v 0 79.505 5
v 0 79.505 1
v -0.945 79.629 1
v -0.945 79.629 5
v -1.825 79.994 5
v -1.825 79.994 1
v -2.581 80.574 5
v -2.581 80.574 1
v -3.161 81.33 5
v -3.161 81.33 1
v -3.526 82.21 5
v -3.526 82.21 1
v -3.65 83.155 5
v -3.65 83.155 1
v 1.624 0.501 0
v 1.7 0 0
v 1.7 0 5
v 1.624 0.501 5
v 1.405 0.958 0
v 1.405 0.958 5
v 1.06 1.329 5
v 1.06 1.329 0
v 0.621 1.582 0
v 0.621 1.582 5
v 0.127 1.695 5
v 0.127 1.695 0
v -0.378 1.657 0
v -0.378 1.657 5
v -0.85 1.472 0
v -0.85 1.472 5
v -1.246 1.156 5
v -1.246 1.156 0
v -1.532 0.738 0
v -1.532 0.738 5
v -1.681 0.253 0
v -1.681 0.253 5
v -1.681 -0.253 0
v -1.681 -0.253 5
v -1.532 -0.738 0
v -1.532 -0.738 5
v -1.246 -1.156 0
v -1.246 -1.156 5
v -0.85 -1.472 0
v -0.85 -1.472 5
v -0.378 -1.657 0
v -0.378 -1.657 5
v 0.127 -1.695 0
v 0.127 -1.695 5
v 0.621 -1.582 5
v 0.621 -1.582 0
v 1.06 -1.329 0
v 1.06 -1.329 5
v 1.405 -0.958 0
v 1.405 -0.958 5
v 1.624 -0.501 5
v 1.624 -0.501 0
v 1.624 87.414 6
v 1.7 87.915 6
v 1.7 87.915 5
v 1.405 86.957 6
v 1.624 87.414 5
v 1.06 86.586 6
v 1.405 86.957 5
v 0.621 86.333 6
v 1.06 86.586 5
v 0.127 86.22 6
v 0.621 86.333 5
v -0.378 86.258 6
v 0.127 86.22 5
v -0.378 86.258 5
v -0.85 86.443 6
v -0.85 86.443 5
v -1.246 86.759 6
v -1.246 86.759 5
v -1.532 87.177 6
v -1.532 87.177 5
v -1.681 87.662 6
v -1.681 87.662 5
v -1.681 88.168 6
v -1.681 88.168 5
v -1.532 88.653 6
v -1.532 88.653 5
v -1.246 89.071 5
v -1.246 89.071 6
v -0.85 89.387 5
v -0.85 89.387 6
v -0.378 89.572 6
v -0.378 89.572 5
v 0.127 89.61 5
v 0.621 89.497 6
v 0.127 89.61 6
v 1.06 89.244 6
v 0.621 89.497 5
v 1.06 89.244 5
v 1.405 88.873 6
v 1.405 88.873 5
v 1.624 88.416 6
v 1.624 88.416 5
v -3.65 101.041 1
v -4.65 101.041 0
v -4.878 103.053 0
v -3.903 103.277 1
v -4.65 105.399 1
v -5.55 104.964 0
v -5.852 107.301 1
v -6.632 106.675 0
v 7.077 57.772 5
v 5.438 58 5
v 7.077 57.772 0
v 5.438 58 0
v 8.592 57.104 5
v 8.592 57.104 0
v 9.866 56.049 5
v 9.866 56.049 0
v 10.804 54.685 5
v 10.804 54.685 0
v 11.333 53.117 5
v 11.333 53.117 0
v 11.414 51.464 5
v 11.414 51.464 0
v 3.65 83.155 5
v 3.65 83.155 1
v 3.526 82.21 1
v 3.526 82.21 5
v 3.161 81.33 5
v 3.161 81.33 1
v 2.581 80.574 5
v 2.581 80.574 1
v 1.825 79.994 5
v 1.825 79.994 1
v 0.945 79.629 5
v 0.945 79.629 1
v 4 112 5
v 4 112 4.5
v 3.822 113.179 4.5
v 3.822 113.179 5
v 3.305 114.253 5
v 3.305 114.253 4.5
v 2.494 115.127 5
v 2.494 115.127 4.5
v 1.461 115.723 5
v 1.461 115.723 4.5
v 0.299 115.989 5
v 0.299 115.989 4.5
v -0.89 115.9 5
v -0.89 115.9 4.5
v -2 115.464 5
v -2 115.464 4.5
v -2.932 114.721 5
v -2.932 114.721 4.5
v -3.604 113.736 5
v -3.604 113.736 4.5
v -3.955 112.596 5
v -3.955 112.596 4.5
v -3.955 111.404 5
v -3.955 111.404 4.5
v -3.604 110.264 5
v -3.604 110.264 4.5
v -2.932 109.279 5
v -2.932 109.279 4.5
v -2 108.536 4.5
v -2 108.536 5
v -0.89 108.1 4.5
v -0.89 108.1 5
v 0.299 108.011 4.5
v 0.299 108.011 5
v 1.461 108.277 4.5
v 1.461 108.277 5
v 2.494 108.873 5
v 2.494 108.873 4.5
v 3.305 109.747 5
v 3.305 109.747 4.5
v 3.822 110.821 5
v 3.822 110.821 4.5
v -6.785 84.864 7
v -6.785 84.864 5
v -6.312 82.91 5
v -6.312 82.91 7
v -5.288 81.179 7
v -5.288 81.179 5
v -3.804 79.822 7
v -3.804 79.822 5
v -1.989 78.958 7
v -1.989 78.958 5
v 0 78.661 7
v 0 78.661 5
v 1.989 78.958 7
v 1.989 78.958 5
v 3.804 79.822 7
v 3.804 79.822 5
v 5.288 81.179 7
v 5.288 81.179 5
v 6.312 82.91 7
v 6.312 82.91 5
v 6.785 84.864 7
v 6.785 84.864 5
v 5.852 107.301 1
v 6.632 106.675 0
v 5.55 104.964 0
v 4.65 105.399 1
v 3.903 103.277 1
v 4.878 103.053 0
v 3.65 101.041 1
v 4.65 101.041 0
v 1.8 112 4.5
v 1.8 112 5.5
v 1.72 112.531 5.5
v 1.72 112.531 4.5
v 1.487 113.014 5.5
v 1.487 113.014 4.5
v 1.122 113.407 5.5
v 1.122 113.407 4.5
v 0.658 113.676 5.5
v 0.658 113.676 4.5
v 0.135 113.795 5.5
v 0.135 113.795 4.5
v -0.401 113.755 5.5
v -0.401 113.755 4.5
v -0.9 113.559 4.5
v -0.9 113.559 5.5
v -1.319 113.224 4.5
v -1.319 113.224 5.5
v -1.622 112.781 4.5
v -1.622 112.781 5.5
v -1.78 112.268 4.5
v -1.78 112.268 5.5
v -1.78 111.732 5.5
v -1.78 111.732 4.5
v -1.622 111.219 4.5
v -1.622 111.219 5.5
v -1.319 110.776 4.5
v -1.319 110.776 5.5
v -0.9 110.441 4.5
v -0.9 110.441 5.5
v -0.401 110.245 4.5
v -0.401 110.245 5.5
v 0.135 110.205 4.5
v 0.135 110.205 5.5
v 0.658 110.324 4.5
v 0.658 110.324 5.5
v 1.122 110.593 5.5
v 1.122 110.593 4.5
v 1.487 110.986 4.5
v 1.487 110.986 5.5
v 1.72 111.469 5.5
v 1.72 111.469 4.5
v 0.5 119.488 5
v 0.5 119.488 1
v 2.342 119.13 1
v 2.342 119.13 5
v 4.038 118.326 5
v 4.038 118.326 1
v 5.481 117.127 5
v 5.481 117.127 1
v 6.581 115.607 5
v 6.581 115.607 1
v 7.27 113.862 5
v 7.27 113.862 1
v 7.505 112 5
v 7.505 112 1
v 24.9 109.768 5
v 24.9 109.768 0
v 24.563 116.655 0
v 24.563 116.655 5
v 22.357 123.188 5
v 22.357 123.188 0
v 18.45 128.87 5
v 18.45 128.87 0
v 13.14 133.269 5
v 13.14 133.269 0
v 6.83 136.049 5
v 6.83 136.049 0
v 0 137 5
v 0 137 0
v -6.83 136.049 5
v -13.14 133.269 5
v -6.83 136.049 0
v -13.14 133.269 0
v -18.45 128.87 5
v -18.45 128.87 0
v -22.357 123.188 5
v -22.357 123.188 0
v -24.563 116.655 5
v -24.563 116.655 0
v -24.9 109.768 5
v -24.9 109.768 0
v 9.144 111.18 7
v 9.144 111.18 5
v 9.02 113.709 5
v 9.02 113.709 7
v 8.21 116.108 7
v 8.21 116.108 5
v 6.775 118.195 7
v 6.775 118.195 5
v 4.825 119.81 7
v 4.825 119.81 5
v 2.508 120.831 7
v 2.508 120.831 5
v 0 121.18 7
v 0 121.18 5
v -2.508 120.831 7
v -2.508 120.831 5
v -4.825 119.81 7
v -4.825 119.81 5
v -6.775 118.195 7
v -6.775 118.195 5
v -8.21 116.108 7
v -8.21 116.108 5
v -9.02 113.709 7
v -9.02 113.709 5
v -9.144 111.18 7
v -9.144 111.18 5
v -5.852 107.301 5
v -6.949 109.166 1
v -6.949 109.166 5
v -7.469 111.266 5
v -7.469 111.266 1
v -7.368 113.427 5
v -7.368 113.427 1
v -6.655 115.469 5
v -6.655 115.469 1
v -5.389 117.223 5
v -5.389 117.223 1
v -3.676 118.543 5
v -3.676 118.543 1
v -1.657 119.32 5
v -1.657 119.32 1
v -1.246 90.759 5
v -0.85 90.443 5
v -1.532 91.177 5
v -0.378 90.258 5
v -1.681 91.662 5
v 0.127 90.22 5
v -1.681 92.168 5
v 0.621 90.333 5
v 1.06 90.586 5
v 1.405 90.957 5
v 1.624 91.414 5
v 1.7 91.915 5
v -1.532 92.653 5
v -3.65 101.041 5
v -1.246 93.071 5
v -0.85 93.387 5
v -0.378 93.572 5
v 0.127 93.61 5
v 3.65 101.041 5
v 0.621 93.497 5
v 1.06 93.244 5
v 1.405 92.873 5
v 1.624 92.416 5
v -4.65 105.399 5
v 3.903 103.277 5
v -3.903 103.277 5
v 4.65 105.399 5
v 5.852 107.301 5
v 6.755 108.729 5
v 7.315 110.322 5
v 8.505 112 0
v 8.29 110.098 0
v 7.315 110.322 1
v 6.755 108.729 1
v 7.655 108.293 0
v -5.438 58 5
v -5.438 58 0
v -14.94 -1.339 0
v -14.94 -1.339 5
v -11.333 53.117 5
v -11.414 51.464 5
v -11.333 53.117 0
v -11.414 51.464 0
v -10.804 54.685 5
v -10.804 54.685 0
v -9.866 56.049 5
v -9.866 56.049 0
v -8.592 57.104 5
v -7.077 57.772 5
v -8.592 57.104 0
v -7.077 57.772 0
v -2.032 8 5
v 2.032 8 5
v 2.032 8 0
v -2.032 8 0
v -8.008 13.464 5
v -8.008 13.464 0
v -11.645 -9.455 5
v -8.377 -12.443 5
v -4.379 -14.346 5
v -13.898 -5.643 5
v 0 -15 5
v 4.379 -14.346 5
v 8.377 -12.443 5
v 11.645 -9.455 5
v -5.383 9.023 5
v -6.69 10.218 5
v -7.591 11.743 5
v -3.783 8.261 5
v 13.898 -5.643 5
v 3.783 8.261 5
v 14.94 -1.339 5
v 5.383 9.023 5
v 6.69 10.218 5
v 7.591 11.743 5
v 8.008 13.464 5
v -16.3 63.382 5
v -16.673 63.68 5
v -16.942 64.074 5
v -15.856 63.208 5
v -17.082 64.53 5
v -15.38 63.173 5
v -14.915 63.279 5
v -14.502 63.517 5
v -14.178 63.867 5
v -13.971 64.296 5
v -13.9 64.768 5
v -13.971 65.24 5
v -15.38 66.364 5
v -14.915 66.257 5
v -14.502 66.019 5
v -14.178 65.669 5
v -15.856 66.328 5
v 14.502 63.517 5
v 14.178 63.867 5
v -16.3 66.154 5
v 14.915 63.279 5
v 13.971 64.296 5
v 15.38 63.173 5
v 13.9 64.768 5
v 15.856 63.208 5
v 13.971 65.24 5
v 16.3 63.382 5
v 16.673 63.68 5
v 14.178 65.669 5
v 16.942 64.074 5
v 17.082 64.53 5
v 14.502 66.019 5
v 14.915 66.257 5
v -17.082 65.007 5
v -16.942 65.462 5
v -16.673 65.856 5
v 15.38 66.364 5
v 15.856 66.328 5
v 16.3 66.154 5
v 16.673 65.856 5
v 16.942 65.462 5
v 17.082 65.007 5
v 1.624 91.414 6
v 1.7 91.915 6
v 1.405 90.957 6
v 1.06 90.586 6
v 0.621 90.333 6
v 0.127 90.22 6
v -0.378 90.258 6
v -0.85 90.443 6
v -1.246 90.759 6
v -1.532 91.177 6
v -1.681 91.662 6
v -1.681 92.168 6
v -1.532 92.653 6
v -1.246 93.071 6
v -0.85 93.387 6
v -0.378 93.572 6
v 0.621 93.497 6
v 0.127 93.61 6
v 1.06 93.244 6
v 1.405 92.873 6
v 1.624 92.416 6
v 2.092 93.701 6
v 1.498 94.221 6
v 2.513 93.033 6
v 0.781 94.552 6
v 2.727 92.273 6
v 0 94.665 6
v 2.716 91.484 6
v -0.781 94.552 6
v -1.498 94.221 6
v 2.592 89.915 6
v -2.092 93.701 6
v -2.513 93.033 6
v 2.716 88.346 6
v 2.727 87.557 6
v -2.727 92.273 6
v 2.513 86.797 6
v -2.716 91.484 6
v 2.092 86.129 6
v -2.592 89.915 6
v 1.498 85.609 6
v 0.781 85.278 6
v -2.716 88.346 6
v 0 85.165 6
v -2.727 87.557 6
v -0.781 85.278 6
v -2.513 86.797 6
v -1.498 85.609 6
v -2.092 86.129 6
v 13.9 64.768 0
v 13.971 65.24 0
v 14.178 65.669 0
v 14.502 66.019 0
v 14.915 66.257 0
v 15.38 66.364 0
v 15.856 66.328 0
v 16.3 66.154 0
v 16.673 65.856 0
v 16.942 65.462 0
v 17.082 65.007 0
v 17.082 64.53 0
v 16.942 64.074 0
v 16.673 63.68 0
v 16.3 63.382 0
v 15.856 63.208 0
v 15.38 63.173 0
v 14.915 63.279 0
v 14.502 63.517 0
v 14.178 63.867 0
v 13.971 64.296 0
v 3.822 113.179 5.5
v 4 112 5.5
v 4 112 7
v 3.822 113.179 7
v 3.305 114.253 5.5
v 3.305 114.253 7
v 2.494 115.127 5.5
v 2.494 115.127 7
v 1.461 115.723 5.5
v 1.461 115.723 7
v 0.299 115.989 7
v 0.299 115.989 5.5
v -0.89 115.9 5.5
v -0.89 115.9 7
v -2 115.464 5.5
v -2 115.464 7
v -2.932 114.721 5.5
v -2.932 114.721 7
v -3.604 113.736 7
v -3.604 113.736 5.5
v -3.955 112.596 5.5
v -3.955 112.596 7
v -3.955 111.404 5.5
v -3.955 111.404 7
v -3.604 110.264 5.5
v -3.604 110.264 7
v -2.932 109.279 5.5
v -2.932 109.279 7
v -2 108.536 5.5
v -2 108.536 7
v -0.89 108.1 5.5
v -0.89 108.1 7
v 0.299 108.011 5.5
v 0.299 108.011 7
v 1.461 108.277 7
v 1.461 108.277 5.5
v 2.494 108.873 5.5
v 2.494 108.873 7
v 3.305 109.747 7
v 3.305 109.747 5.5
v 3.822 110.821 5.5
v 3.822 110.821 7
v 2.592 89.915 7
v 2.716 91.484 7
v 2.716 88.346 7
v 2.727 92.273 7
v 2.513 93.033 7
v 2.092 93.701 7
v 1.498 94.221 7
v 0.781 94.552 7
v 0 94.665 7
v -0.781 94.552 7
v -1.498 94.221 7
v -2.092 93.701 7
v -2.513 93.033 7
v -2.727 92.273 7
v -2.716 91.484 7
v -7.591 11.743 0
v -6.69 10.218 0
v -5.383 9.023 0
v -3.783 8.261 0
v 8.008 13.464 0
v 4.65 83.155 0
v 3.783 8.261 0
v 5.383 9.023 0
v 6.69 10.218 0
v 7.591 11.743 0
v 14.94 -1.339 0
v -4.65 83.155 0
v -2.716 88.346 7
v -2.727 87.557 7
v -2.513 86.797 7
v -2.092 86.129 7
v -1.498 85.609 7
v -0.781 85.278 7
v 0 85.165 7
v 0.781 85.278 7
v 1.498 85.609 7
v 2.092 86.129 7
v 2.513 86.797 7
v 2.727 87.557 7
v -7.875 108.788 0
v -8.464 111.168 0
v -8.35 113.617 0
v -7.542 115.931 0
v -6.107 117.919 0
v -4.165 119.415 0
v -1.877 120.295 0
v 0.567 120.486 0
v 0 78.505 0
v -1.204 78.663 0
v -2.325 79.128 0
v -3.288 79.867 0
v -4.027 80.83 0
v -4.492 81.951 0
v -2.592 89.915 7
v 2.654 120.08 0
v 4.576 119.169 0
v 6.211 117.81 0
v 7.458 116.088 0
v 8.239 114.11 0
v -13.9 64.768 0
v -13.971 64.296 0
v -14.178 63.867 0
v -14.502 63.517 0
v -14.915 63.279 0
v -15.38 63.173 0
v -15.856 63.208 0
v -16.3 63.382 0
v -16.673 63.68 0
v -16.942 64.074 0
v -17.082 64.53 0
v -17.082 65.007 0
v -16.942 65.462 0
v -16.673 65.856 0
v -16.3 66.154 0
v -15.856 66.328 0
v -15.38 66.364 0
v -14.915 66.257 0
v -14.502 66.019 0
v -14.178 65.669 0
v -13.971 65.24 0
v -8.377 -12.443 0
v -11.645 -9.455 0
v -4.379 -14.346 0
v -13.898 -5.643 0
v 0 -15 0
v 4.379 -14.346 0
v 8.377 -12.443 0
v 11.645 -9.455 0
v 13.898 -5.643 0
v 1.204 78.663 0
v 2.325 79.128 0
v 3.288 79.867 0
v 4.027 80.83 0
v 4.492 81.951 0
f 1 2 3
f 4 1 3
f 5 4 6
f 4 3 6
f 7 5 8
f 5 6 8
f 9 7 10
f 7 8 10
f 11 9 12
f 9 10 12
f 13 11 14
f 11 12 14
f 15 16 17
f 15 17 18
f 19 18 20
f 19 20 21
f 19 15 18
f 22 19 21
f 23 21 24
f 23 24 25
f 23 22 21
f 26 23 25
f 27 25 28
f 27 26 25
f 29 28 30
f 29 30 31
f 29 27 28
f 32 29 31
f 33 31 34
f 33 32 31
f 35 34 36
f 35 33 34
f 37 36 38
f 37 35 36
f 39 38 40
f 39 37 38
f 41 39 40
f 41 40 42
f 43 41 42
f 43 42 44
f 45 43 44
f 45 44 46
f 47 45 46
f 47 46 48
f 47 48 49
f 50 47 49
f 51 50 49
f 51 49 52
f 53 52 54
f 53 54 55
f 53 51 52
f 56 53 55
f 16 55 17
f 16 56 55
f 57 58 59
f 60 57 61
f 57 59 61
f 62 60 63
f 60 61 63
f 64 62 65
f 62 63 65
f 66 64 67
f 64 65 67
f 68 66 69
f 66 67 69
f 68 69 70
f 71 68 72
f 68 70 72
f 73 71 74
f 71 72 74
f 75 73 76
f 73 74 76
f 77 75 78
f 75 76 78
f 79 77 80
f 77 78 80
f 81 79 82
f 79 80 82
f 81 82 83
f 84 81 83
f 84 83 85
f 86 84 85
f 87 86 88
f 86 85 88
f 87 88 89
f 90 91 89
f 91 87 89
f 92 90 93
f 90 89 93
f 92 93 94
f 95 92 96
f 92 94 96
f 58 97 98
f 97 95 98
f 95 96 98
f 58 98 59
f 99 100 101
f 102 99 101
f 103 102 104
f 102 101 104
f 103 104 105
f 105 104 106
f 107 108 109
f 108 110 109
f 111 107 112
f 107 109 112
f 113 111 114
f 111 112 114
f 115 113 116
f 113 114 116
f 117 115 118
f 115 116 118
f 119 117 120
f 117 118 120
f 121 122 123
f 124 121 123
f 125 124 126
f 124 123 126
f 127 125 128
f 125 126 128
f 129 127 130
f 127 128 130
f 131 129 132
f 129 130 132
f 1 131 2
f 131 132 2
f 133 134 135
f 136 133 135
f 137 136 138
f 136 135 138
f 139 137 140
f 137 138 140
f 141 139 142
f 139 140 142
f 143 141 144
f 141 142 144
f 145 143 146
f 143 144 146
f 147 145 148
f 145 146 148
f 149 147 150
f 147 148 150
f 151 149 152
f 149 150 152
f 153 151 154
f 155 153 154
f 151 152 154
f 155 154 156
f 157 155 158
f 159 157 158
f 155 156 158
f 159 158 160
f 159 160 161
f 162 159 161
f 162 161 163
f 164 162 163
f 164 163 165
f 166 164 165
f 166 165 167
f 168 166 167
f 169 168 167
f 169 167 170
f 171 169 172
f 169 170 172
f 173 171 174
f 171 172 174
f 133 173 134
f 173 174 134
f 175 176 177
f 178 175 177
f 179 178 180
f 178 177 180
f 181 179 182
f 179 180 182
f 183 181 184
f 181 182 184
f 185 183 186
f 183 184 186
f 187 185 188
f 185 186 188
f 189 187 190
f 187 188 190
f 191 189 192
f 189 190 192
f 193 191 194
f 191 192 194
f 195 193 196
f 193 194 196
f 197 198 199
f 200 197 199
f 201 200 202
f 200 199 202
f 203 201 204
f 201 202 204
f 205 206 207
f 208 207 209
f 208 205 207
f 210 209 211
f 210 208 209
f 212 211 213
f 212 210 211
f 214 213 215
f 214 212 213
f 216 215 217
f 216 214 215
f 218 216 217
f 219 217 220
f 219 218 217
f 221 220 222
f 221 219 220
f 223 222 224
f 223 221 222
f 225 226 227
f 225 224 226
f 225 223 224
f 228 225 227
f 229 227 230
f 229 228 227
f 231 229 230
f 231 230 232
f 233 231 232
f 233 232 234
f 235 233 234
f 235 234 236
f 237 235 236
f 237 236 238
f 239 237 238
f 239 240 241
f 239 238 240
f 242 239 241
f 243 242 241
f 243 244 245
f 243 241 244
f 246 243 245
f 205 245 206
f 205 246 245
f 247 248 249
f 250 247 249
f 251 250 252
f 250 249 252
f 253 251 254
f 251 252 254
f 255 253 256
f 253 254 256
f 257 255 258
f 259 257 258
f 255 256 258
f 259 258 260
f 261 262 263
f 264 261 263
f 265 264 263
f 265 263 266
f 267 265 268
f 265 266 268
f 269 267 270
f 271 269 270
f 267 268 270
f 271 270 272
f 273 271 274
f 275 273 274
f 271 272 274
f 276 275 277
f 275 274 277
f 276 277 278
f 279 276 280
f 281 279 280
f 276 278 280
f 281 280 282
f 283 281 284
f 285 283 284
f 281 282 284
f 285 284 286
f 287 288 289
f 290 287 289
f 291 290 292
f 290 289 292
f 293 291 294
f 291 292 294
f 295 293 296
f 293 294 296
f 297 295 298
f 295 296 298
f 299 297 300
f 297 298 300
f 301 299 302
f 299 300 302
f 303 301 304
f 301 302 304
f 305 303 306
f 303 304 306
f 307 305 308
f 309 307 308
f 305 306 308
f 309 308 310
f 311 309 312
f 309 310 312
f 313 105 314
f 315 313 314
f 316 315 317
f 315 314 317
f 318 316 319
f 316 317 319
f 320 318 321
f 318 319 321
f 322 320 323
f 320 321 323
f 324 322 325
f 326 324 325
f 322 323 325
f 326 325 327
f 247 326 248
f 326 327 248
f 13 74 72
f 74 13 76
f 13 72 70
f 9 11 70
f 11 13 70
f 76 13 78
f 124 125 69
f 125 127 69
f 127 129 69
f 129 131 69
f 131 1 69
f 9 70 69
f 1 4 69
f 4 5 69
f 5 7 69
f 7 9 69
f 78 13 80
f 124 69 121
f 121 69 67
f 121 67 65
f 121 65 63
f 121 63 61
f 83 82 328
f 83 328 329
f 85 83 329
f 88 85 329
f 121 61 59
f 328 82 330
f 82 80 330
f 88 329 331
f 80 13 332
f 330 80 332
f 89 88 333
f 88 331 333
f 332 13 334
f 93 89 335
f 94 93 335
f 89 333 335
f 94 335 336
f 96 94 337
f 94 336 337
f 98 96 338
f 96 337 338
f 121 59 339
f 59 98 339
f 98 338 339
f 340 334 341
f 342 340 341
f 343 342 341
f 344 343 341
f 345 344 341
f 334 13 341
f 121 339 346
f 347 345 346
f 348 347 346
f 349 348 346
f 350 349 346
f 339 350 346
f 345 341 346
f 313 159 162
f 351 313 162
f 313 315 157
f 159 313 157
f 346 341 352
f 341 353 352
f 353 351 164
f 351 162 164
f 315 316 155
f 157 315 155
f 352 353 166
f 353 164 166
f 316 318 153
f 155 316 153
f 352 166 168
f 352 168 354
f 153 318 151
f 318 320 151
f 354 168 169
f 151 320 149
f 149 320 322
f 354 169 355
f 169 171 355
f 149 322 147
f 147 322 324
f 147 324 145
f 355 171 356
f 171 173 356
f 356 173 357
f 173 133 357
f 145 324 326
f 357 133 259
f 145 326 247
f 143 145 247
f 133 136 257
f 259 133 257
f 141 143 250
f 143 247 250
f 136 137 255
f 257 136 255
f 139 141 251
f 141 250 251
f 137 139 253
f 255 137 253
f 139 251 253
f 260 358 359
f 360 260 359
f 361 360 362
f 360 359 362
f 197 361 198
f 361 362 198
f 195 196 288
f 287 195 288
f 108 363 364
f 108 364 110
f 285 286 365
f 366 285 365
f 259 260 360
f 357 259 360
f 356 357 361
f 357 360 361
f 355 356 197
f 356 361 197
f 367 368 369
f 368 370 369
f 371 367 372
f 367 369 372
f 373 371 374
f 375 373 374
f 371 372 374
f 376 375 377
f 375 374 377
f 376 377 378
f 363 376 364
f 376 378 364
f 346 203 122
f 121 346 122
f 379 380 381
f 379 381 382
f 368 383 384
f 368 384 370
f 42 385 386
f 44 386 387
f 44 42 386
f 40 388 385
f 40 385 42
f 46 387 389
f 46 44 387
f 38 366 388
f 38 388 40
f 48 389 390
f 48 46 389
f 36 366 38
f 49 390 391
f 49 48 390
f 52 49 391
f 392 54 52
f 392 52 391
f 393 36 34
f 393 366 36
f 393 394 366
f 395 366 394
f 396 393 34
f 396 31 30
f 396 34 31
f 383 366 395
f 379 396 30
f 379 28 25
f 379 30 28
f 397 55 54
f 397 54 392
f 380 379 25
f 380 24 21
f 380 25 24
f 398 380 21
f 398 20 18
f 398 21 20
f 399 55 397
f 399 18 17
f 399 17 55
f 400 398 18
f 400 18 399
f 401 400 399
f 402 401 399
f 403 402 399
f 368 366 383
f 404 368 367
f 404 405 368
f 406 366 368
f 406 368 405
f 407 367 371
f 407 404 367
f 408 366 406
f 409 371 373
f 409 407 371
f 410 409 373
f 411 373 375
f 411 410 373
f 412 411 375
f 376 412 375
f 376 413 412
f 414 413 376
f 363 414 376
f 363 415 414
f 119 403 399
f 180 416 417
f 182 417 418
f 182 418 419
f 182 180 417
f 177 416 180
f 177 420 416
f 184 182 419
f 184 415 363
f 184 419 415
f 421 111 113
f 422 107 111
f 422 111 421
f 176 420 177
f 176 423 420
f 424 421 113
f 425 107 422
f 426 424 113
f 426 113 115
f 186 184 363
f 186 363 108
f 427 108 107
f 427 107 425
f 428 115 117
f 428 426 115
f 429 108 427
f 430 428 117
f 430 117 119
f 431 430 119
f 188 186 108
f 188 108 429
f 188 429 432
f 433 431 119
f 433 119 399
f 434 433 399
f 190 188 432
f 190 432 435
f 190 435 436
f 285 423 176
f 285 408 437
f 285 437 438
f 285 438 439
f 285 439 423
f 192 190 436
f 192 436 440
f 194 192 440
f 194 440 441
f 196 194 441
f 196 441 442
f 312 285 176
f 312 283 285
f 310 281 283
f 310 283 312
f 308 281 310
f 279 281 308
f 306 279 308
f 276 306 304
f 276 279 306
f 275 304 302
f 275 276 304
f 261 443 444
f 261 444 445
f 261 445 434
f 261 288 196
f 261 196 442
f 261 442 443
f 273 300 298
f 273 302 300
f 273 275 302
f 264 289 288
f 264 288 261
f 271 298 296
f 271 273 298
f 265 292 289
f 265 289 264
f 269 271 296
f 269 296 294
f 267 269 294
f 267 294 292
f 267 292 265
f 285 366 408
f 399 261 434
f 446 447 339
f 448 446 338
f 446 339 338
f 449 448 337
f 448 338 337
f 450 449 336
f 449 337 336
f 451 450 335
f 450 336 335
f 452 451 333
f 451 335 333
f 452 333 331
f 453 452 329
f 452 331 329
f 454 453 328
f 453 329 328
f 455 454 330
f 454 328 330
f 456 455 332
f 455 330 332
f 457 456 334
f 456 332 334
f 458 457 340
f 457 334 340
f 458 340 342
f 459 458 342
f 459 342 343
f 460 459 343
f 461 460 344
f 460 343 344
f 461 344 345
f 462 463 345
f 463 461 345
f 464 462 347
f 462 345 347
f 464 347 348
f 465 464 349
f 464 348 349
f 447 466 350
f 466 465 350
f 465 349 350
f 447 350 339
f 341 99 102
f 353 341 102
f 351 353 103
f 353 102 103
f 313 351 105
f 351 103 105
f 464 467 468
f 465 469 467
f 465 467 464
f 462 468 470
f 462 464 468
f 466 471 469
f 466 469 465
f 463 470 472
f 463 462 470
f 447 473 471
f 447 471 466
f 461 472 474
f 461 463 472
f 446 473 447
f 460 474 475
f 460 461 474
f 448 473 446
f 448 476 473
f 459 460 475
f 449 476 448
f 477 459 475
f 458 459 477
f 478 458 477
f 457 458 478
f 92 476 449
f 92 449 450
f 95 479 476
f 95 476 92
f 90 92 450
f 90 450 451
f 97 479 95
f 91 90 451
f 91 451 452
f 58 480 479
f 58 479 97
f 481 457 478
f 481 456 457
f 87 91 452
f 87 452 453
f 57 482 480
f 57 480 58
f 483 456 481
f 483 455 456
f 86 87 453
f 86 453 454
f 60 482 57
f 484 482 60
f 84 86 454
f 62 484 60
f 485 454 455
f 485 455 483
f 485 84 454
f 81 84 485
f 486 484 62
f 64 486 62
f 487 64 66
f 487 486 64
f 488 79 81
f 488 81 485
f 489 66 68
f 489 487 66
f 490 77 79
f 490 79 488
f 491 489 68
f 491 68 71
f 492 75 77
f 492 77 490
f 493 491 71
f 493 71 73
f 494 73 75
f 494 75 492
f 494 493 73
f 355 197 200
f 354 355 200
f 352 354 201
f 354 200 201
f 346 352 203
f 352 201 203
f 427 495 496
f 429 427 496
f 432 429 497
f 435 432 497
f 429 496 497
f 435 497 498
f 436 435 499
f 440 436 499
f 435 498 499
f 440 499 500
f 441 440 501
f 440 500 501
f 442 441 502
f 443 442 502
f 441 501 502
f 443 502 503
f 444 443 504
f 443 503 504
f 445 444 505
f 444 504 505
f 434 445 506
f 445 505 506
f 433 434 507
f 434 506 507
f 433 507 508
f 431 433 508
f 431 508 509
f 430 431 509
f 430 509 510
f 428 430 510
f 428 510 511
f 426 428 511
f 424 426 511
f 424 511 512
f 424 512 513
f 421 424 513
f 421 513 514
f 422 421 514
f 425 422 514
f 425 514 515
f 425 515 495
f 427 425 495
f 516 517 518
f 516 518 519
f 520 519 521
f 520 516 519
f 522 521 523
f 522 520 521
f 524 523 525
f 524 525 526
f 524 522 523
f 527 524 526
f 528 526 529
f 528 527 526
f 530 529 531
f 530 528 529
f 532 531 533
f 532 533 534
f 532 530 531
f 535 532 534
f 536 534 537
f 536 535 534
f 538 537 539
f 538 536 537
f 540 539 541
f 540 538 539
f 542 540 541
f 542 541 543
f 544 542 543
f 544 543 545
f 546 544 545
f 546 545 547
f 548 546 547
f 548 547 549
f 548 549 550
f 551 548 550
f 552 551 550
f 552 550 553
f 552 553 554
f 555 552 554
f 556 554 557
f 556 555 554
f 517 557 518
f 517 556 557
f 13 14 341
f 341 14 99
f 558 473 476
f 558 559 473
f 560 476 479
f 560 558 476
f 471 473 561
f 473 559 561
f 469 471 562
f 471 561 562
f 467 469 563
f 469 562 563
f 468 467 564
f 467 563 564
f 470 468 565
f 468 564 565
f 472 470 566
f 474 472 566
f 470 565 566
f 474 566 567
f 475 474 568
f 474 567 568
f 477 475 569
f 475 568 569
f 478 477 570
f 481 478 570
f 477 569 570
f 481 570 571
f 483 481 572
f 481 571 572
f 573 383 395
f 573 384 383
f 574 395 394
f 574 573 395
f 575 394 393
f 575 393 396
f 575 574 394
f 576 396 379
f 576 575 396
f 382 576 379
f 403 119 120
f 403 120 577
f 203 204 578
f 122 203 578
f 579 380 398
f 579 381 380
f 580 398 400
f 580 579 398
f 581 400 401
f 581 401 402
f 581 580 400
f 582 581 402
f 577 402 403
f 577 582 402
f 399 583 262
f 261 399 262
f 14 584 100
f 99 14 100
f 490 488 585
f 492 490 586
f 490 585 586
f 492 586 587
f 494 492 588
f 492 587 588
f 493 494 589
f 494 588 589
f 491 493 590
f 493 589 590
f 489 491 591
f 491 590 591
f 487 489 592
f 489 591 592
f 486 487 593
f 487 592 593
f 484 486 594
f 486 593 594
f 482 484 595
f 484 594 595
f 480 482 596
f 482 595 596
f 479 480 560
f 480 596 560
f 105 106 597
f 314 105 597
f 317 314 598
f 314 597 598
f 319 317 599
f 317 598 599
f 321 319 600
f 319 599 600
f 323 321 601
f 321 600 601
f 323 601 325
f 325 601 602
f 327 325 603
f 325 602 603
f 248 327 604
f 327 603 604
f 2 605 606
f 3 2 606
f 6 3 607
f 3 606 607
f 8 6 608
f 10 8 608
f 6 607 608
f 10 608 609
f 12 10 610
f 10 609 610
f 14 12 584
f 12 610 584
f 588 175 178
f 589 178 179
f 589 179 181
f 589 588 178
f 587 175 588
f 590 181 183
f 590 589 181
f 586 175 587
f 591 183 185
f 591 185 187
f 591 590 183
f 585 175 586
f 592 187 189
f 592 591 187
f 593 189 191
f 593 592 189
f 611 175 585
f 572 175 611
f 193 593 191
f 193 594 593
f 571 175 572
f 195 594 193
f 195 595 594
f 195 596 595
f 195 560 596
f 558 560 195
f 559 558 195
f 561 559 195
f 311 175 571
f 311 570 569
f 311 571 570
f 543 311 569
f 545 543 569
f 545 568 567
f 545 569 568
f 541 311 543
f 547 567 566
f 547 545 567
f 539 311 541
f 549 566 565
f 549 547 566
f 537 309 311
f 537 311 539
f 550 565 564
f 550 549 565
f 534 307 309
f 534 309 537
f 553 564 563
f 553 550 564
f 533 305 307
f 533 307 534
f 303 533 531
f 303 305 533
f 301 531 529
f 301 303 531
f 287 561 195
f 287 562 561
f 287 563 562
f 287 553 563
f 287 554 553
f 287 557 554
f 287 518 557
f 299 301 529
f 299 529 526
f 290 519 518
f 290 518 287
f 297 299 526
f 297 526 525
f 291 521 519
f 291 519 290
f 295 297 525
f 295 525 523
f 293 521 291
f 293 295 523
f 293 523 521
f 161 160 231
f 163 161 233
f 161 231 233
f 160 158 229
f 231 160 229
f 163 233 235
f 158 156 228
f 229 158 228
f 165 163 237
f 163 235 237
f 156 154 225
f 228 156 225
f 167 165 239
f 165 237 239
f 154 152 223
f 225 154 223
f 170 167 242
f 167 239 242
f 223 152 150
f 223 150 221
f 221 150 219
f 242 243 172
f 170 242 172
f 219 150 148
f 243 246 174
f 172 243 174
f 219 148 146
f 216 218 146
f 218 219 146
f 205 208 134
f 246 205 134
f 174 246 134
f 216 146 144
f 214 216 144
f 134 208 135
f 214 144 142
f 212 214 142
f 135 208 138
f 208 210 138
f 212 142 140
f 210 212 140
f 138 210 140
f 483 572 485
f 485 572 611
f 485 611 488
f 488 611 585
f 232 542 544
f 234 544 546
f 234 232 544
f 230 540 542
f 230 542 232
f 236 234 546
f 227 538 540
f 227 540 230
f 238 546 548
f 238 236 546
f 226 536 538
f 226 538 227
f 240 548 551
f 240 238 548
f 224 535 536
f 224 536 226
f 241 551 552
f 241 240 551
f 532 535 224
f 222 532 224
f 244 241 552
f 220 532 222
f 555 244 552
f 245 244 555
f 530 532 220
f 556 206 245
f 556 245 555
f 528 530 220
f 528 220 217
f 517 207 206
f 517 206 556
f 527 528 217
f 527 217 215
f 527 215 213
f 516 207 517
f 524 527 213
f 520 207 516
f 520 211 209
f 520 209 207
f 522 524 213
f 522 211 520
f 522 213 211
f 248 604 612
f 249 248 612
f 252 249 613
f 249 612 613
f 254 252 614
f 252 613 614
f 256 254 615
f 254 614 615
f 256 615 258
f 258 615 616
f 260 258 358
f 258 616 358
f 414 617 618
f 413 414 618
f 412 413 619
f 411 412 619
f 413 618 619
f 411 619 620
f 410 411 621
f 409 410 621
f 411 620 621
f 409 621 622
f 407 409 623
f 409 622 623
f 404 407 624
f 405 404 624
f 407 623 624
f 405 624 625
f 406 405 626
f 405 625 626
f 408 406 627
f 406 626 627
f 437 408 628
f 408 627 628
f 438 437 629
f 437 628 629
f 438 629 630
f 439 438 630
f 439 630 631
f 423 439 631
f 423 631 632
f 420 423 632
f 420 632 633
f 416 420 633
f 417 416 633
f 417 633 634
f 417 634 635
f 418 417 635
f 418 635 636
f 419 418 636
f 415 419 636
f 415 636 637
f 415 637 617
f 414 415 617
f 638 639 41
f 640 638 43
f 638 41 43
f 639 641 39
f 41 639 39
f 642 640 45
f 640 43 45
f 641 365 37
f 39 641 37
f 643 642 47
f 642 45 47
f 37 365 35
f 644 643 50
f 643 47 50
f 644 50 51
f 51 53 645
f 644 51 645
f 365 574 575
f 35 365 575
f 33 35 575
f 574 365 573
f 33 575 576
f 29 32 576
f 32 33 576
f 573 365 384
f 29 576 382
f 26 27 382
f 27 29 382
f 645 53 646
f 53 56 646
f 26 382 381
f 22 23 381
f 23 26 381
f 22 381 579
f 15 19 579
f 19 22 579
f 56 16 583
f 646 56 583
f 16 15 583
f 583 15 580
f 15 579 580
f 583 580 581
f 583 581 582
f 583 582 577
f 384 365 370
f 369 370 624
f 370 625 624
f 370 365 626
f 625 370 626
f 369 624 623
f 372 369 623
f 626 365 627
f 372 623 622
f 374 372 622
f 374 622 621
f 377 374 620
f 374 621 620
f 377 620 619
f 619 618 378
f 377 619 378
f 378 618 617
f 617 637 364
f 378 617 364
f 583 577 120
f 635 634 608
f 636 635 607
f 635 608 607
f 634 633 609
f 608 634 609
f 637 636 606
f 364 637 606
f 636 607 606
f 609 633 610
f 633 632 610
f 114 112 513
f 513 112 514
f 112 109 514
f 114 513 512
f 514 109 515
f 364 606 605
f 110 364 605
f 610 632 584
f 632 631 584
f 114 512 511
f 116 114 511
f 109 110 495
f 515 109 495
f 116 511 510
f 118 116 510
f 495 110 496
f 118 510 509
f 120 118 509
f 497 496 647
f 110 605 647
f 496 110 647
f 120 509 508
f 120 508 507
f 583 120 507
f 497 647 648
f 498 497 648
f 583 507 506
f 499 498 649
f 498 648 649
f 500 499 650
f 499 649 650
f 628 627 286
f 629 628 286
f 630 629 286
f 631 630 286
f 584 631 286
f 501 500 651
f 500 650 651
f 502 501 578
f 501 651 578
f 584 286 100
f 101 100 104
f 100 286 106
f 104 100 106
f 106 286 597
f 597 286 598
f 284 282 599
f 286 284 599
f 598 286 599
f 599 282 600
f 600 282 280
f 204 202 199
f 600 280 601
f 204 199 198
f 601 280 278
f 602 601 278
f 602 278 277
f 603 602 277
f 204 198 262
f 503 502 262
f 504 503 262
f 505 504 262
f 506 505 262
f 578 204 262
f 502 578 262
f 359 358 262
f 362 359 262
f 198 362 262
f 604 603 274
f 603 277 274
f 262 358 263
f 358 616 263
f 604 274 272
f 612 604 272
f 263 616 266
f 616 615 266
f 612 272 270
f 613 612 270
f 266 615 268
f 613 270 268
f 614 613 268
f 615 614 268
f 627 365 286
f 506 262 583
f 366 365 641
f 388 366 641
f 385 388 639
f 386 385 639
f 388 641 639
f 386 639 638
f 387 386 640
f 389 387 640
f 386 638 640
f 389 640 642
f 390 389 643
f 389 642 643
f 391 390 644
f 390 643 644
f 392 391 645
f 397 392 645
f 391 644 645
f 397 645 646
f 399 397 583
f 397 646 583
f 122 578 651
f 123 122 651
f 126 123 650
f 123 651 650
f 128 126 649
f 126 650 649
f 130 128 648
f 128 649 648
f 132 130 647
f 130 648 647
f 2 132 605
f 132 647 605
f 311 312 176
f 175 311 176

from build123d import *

# Parameters (mm, degrees)
CROQUIS1_R                                           = 1.7
SALIENTE_EXTRUIR1_DEPTH                              = 5
CROQUIS11_R                                          = 1.6
CORTAR_EXTRUIR1_DEPTH                                = 6
CORTAR_EXTRUIR2_REACH                                = 141.352
CROQUIS13_R                                          = 1.8
SALIENTE_EXTRUIR2_DEPTH                              = 2
SALIENTE_EXTRUIR3_START                              = -0.5
CROQUIS13_3_R                                        = 4
CROQUIS13_3_R_2                                      = 1.8
SALIENTE_EXTRUIR3_DEPTH                              = 0.5
CORTAR_EXTRUIR3_START                                = -1.5
CROQUIS14_R                                          = 4
CORTAR_EXTRUIR3_DEPTH                                = 1.5
CHAFL_N1_SIZE                                        = 1
REFRENTADO_PARA_TORNILLO_CON_CABEZA_TRON_D           = 3.4
REFRENTADO_PARA_TORNILLO_CON_CABEZA_TRON_CBORE_D     = 5.5
REFRENTADO_PARA_TORNILLO_CON_CABEZA_TRON_CBORE_DEPTH = 1
REDONDEO1_R                                          = 10
REDONDEO2_R                                          = 6


with BuildPart() as part:
    # Croquis1 → Saliente-Extruir1 (new body)
    with BuildSketch(Plane.XY):
        with BuildLine():
            Line((-24.90015137, 109.767857143), (-14.940090822, -1.339285714))
            ThreePointArc((-14.940090822, -1.339285714), (0, -15), (14.940090822, -1.339285714))
            Line((14.940090822, -1.339285714), (24.90015137, 109.767857143))
            ThreePointArc((24.90015137, 109.767857143), (0, 137), (-24.90015137, 109.767857143))
        make_face()
        Circle(CROQUIS1_R, mode=Mode.SUBTRACT)
        with BuildLine():
            ThreePointArc((0, 79.505), (-2.580939751, 80.574060249), (-3.65, 83.155))
            Line((-3.65, 83.155), (-3.65, 101.040870244))
            ThreePointArc((-3.65, 101.040870244), (-4.216609288, 104.359173979), (-5.852227935, 107.30144137))
            ThreePointArc((-5.852227935, 107.30144137), (-6.655195316, 115.468919185), (0.5, 119.488325914))
            ThreePointArc((0.5, 119.488325914), (5.480762949, 117.127013019), (7.505, 112))
            ThreePointArc((7.505, 112), (7.079759729, 109.509613047), (5.852227935, 107.30144137))
            ThreePointArc((5.852227935, 107.30144137), (4.216609288, 104.359173979), (3.65, 101.040870244))
            Line((3.65, 101.040870244), (3.65, 83.155))
            ThreePointArc((3.65, 83.155), (2.580939751, 80.574060249), (0, 79.505))
        make_face(mode=Mode.SUBTRACT)
    extrude(amount=SALIENTE_EXTRUIR1_DEPTH)

    # Croquis11 → Cortar-Extruir1 (cut)
    with BuildSketch(Plane(origin=(0, 0, 0), x_dir=(-1, 0, 0), z_dir=(0, 0, -1))):
        with Locations((-15.5, 64.768083746)):
            Circle(CROQUIS11_R)
        with Locations(Location((15.5, 64.768083746, 0), (0, 0, 180))):
            Circle(CROQUIS11_R)
    extrude(amount=-CORTAR_EXTRUIR1_DEPTH, mode=Mode.SUBTRACT)

    # Croquis12 → Cortar-Extruir2 (cut, up to next)
    with BuildSketch(Plane.XY.offset(5), mode=Mode.PRIVATE) as cortar_extruir2_sk1:
        Polygon((-12, 58), (12, 58), (7.517812675, 8), (-7.517812675, 8), align=None)
    cortar_extruir2_tool1 = extrude(cortar_extruir2_sk1.sketch, amount=-CORTAR_EXTRUIR2_REACH, mode=Mode.PRIVATE) & part.part
    add(cortar_extruir2_tool1.solids().sort_by_distance((0, 34.913717, 5))[0], mode=Mode.SUBTRACT)

    # Croquis13 → Saliente-Extruir2 (add)
    with BuildSketch(Plane.XY.offset(5)):
        with BuildLine():
            Line((6.784704059, 84.864496193), (9.143753072, 111.180319718))
            ThreePointArc((9.143753072, 111.180319718), (0, 121.180419163), (-9.143753072, 111.180319718))
            Line((-9.143753072, 111.180319718), (-6.784704059, 84.864496193))
            ThreePointArc((-6.784704059, 84.864496193), (0, 78.660792028), (6.784704059, 84.864496193))
        make_face()
        with Locations((0, 112)):
            Circle(CROQUIS13_R, mode=Mode.SUBTRACT)
    extrude(amount=SALIENTE_EXTRUIR2_DEPTH)

    # Croquis13<3> → Saliente-Extruir3 (add)
    with BuildSketch(Plane.XY.offset(5).offset(SALIENTE_EXTRUIR3_START)):
        with Locations((0, 112)):
            Circle(CROQUIS13_3_R)
        with Locations((0, 112)):
            Circle(CROQUIS13_3_R_2, mode=Mode.SUBTRACT)
    extrude(amount=SALIENTE_EXTRUIR3_DEPTH)

    # Croquis14 → Cortar-Extruir3 (cut)
    with BuildSketch(Plane.XY.offset(7).offset(CORTAR_EXTRUIR3_START)):
        with Locations((0, 112)):
            Circle(CROQUIS14_R)
    extrude(amount=CORTAR_EXTRUIR3_DEPTH, mode=Mode.SUBTRACT)

    # Chaflán1
    chafl_n1_edges = [part.edges().sort_by_distance(p)[0] for p in [
        (3.65, 92.097935122, 0),
        (4.216609288, 104.359173979, 0),
        (-2.490386953, 119.079759729, 0),
        (-4.216609288, 104.359173979, 0),
        (-3.65, 92.097935122, 0),
        (0, 79.505, 0),
    ]]
    chamfer(chafl_n1_edges, length=CHAFL_N1_SIZE)

    # Refrentado para tornillo con cabeza troncocónica de M31 (through all)
    with Locations(Plane(origin=(0, 0, 7), x_dir=(-1, 0, 0), z_dir=(0, 0, 1))):
        with Locations((0, -91.915), (0, -87.915)):
            CounterBoreHole(REFRENTADO_PARA_TORNILLO_CON_CABEZA_TRON_D / 2, REFRENTADO_PARA_TORNILLO_CON_CABEZA_TRON_CBORE_D / 2, REFRENTADO_PARA_TORNILLO_CON_CABEZA_TRON_CBORE_DEPTH)

    # Redondeo1
    redondeo1_edges = [part.edges().sort_by_distance(p)[0] for p in [
        (-1.887458609, 89.915, 6.5),
        (1.887458609, 89.915, 6.5),
    ]]
    fillet(redondeo1_edges, radius=REDONDEO1_R)

    # Redondeo2
    redondeo2_edges = [part.edges().sort_by_distance(p)[0] for p in [
        (7.517812675, 8, 2.5),
        (-7.517812675, 8, 2.5),
        (-12, 58, 2.5),
        (12, 58, 2.5),
    ]]
    fillet(redondeo2_edges, radius=REDONDEO2_R)


solid = part.part
